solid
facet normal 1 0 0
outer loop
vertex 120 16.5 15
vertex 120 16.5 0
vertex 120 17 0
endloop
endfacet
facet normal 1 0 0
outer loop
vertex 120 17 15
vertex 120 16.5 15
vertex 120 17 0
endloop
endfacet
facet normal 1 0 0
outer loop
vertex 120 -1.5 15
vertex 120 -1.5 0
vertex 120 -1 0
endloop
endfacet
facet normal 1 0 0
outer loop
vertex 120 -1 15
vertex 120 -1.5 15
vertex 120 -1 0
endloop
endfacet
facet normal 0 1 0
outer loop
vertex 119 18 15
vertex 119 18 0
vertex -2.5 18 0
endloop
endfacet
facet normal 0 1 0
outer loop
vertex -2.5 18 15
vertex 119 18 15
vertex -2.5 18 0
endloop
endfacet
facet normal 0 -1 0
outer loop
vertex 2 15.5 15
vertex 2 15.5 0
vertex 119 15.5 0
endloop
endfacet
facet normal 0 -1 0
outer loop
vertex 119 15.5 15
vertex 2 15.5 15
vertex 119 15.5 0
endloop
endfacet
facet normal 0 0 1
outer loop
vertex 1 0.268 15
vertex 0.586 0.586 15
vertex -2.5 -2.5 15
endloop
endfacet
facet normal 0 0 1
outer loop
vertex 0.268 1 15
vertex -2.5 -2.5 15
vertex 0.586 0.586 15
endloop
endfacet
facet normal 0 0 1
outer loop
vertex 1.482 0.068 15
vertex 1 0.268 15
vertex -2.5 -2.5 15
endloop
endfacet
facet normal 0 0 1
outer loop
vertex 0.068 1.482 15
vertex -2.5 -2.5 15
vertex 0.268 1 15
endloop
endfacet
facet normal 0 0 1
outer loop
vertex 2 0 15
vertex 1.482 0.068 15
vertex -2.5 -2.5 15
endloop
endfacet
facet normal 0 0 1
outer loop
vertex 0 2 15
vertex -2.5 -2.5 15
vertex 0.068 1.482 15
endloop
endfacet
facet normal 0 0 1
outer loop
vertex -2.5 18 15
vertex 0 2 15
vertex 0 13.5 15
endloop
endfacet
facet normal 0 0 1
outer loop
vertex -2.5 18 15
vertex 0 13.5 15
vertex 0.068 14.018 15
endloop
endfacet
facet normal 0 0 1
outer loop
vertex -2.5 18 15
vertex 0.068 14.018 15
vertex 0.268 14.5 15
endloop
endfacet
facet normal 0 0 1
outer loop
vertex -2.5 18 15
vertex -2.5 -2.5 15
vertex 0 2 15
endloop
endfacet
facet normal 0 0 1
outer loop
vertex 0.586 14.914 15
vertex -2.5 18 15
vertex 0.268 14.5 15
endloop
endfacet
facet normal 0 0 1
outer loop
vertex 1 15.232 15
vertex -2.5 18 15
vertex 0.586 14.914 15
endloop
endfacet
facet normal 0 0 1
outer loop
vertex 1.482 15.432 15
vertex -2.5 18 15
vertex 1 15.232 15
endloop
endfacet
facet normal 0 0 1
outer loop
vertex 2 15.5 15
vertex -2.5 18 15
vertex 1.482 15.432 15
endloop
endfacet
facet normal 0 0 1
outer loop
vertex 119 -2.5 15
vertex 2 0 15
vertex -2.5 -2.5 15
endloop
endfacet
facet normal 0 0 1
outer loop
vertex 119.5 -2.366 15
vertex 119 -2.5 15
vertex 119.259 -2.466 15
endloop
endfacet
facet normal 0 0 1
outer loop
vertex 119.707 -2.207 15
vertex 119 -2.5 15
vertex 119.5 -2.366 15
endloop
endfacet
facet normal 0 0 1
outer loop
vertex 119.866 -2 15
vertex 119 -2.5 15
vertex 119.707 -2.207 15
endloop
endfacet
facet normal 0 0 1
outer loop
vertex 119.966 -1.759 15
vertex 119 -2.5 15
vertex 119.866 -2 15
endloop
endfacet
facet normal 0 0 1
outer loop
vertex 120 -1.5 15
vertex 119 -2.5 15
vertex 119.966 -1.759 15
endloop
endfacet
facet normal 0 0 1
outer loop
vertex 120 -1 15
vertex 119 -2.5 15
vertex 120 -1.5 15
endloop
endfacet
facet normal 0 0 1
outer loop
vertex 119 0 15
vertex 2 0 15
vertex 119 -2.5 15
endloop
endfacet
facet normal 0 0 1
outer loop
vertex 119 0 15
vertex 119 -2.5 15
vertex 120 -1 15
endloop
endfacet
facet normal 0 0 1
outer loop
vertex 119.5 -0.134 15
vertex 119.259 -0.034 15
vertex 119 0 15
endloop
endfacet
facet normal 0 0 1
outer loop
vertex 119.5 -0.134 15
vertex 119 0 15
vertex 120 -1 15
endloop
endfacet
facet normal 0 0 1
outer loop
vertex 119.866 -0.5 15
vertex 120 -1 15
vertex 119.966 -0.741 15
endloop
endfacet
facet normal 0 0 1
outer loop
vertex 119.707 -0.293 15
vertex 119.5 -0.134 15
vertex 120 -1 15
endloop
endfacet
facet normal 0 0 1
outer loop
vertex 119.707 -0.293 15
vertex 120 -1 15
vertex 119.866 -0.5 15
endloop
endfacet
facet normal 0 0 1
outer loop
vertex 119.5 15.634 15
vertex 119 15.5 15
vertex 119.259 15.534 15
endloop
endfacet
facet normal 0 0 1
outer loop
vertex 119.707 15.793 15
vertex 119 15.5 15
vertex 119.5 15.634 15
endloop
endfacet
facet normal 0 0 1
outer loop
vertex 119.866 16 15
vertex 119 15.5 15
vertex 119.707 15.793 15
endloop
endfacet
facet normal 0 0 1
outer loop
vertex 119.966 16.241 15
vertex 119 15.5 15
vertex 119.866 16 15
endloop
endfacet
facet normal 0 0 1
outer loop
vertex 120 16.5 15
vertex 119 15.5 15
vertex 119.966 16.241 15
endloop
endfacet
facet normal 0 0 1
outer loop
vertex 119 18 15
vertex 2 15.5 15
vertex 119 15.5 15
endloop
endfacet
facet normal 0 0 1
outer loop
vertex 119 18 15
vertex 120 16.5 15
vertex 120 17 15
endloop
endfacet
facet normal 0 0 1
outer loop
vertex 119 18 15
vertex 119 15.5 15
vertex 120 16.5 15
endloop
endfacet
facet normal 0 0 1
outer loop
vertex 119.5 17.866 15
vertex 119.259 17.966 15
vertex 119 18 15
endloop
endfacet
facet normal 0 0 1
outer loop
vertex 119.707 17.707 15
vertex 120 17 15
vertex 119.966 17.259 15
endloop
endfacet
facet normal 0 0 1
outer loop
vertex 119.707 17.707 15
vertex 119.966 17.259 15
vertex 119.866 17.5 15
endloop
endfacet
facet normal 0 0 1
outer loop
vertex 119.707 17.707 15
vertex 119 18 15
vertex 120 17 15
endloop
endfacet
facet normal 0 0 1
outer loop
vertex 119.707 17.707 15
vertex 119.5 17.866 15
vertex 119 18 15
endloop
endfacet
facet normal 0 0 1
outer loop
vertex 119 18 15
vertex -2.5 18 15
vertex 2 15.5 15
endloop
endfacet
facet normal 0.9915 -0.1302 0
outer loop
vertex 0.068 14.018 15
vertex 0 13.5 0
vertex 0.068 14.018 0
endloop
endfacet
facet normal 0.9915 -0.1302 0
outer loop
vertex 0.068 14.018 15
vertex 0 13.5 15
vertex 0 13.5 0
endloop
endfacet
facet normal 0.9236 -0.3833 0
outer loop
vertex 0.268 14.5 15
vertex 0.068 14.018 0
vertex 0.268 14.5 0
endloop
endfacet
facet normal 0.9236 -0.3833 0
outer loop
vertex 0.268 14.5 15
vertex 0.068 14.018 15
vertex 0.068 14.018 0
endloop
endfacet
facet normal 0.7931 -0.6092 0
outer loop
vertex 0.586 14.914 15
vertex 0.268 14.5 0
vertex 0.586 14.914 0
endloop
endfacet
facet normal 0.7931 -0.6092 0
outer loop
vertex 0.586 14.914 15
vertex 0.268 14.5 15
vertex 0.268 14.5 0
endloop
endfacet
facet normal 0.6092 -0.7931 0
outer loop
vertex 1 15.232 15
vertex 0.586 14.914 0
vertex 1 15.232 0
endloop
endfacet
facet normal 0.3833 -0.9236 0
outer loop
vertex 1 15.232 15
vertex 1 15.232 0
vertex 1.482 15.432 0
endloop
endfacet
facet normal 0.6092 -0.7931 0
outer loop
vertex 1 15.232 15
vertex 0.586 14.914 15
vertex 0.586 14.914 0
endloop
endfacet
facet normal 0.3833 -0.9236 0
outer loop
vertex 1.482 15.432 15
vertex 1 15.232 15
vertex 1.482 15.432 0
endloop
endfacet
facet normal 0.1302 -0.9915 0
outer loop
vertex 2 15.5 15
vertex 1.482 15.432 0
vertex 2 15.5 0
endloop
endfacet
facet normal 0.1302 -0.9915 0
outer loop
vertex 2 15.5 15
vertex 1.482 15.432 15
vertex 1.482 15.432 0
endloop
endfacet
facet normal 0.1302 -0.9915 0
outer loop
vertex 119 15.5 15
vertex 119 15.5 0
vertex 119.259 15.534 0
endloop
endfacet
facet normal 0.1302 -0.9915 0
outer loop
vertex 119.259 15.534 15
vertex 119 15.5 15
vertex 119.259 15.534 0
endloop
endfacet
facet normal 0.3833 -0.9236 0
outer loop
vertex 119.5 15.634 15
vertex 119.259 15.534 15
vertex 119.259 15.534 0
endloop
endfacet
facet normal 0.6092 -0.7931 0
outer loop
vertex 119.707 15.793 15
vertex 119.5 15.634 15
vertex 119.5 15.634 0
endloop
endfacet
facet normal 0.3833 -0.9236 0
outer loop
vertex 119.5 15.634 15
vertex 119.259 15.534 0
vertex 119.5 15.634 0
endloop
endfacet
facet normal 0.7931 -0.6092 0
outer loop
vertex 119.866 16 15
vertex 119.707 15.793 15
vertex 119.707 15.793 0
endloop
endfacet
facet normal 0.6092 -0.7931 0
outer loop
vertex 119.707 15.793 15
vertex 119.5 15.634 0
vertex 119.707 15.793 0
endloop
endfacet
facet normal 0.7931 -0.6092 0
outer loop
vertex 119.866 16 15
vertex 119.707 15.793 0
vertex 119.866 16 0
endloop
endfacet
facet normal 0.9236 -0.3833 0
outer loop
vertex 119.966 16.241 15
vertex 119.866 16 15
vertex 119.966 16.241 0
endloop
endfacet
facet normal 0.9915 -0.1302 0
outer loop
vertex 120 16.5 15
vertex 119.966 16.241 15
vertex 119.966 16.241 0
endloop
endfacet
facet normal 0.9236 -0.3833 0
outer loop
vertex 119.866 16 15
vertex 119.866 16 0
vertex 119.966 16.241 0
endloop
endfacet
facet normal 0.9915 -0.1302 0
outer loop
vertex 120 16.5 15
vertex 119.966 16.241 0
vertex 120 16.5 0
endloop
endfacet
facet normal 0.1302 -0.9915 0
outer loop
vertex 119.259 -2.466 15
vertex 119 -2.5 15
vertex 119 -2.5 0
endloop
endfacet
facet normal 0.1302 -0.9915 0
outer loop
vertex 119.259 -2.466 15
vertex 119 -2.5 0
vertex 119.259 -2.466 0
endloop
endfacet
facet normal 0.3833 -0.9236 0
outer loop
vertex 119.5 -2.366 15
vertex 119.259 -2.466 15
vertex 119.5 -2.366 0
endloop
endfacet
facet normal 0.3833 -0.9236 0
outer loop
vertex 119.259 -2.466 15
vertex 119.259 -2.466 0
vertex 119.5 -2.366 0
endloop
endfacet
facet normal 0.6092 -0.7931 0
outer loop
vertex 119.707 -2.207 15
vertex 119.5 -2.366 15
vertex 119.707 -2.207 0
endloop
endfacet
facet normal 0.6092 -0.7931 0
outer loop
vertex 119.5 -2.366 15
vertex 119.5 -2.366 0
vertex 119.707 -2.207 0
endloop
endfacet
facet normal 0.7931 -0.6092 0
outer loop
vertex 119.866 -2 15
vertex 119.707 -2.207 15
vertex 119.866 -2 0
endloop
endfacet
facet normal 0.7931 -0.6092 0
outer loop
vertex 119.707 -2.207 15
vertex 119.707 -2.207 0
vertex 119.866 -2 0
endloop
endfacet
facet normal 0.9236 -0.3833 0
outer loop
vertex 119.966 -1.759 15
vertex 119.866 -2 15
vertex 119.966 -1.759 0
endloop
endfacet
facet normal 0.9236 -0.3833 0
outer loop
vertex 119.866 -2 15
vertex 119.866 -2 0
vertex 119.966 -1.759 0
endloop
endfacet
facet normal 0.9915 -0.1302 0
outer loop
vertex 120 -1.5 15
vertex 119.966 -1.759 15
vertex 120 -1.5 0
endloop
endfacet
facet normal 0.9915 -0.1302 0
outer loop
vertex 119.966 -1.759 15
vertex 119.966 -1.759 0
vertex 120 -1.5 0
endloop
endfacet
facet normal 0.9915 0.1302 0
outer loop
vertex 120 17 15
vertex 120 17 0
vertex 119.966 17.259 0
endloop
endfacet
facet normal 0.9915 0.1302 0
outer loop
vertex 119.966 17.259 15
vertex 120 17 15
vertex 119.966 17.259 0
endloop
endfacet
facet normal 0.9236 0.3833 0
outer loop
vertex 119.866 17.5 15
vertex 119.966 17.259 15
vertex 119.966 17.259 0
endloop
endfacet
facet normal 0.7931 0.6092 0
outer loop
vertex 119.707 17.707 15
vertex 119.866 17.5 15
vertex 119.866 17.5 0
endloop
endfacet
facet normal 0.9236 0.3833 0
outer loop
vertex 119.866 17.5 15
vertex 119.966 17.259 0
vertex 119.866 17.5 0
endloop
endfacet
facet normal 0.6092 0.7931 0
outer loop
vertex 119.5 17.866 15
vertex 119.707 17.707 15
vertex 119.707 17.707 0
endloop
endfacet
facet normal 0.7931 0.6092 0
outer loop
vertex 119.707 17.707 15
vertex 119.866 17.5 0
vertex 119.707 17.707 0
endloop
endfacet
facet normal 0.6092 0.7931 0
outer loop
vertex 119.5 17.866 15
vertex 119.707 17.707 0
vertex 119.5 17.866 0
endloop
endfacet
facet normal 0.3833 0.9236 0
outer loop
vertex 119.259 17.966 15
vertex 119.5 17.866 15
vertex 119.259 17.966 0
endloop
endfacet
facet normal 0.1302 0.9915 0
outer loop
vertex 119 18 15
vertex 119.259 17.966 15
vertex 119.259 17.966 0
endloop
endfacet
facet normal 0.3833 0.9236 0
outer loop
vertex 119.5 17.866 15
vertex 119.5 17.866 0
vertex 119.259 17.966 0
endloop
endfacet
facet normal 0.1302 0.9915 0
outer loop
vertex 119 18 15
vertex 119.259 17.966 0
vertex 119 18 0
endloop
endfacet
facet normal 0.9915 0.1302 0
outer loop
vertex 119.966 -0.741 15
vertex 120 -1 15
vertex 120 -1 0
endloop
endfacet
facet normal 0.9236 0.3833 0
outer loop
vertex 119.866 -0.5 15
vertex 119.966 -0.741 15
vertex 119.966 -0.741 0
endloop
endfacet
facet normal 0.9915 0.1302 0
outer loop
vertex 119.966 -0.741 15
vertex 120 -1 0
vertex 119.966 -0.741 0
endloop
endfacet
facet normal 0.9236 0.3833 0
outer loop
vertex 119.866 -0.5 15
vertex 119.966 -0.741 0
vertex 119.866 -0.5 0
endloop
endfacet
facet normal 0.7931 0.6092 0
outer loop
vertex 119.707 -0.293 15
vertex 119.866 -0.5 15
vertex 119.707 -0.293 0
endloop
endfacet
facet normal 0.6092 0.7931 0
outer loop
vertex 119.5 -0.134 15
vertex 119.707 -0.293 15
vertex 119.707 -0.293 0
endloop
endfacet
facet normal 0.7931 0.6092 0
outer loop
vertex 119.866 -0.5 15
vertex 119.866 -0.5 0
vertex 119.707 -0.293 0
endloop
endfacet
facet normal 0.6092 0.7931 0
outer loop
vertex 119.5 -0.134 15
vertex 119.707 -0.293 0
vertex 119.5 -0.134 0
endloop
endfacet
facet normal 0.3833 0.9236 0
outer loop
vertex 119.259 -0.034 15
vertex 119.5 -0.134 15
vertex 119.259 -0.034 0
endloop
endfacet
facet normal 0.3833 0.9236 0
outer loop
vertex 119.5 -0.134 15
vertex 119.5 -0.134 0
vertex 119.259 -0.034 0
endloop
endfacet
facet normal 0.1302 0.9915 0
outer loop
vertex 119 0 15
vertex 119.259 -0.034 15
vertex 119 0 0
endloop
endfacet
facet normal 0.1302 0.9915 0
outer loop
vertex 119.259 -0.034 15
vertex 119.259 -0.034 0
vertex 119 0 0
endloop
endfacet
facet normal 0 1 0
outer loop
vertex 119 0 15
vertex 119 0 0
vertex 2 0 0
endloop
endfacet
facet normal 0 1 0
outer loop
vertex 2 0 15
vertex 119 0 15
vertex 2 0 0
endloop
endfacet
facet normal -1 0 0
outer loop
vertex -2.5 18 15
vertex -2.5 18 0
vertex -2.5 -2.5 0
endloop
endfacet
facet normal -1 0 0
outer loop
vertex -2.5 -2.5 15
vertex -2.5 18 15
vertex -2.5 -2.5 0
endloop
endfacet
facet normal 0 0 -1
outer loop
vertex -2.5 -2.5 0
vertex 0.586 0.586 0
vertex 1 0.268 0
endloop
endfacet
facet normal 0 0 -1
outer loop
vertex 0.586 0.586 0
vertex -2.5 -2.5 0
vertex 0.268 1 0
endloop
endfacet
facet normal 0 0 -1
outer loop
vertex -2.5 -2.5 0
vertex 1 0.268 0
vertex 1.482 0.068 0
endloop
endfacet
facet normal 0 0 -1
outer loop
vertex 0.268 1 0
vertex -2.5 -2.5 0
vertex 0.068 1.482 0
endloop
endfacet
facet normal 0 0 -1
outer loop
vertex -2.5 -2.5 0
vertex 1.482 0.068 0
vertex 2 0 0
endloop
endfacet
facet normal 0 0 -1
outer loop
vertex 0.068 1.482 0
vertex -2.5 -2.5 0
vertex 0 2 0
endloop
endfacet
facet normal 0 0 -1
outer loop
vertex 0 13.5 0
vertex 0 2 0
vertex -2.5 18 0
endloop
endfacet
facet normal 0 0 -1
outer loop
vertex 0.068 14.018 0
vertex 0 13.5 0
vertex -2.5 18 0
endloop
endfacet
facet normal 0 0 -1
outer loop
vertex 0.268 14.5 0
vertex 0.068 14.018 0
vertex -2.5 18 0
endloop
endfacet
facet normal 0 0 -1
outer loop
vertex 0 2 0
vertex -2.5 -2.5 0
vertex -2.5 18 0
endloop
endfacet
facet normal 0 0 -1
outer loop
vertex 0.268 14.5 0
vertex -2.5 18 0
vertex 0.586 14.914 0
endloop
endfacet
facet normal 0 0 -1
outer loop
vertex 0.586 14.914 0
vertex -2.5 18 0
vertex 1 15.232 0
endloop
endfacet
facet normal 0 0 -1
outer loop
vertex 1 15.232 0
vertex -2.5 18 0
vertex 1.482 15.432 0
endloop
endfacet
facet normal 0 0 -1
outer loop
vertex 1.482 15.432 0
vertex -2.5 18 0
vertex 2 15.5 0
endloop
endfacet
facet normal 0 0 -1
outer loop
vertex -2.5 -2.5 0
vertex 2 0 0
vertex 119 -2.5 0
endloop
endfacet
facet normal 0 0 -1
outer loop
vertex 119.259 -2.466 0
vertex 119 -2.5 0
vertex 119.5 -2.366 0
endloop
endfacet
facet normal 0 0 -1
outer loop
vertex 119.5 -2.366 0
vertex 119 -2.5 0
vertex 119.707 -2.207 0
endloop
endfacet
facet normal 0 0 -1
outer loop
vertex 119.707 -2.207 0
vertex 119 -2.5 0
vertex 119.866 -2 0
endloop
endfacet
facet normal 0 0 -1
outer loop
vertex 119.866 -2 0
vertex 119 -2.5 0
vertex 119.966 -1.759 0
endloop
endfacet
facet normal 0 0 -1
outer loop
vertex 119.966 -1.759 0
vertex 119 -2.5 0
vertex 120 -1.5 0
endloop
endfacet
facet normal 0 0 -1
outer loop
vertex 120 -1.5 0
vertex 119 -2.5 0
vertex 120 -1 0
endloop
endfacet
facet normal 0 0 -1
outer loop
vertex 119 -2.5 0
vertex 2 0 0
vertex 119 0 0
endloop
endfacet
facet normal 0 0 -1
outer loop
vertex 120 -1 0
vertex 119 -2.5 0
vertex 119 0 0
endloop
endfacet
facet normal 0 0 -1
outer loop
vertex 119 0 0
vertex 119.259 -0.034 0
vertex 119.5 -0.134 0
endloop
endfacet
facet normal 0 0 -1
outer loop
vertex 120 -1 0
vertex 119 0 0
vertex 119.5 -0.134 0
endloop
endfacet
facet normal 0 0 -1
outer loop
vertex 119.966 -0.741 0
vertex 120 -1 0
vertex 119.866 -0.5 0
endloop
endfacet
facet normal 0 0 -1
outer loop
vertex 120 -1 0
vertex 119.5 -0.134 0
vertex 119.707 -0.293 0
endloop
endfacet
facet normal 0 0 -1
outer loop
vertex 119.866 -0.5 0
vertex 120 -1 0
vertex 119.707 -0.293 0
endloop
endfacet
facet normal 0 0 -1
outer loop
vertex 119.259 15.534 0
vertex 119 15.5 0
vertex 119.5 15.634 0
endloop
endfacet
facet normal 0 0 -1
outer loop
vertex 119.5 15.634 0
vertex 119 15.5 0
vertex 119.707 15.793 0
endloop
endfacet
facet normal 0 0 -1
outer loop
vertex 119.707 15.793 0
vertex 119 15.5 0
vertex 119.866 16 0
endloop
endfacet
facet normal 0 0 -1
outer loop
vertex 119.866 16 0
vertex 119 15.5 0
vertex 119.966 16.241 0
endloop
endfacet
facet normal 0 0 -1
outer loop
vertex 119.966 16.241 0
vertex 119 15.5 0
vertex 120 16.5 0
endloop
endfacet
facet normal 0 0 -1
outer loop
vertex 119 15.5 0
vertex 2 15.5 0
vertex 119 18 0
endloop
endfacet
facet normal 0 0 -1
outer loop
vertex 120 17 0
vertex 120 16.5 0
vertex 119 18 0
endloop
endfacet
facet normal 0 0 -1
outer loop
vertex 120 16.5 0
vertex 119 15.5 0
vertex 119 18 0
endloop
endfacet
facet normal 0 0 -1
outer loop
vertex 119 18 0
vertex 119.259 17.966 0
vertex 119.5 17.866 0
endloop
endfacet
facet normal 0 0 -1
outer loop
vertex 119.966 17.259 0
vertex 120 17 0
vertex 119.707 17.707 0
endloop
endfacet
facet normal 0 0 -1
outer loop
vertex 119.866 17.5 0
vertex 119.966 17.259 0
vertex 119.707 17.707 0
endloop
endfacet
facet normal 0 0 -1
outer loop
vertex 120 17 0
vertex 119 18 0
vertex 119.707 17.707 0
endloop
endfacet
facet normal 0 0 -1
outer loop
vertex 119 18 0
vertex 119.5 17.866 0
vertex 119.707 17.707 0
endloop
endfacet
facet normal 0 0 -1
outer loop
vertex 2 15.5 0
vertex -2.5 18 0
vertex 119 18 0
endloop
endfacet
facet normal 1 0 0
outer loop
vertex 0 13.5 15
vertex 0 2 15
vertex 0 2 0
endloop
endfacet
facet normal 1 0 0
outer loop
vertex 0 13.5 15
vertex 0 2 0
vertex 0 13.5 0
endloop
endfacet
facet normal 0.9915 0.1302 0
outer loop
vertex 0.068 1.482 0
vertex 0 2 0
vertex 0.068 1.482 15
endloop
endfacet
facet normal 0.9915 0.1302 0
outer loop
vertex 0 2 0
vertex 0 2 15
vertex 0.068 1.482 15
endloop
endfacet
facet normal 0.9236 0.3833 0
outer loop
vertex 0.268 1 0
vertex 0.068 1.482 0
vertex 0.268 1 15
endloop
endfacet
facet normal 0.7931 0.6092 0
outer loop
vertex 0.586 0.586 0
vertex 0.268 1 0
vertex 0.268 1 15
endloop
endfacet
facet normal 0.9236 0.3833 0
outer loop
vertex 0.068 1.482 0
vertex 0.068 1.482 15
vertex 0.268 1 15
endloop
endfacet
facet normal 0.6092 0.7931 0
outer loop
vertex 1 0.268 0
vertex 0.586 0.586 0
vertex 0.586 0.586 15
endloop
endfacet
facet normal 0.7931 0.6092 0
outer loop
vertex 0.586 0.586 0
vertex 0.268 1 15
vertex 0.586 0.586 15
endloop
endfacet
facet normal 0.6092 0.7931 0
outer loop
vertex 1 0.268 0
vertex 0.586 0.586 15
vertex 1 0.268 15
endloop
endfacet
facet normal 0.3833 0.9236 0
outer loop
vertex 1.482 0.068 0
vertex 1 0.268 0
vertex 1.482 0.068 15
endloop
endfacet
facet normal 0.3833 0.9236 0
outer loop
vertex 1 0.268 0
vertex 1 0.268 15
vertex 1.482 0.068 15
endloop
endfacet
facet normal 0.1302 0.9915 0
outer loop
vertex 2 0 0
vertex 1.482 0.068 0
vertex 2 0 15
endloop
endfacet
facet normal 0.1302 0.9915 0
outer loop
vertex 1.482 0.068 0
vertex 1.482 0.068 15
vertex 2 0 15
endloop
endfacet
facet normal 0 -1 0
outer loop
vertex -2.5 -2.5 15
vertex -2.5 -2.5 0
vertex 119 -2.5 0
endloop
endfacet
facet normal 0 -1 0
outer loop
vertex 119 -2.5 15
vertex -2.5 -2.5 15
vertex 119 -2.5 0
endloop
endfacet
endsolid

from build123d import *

# Parameters (mm, degrees)
BOSS_EXTRUDE1_DEPTH = 15
FILLET1_R           = 2


with BuildPart() as part:
    # Sketch1 → Boss-Extrude1 (new body)
    with BuildSketch(Plane.XY):
        with BuildLine():
            Line((0, 0), (0, 15.5))
            Line((0, 15.5), (119, 15.5))
            ThreePointArc((119, 15.5), (119.707106781, 15.792893219), (120, 16.5))
            Line((120, 16.5), (120, 17))
            ThreePointArc((120, 17), (119.707106781, 17.707106781), (119, 18))
            Line((119, 18), (-2.5, 18))
            Line((-2.5, 18), (-2.5, -2.5))
            Line((-2.5, -2.5), (119, -2.5))
            ThreePointArc((119, -2.5), (119.707106781, -2.207106781), (120, -1.5))
            Line((120, -1.5), (120, -1))
            ThreePointArc((120, -1), (119.707106781, -0.292893219), (119, 0))
            Line((119, 0), (0, 0))
        make_face()
    extrude(amount=BOSS_EXTRUDE1_DEPTH)

    # Fillet1
    fillet1_edges = [part.edges().sort_by_distance(p)[0] for p in [
        (0, 15.5, 7.5),
        (0, 0, 7.5),
    ]]
    fillet(fillet1_edges, radius=FILLET1_R)


solid = part.part
